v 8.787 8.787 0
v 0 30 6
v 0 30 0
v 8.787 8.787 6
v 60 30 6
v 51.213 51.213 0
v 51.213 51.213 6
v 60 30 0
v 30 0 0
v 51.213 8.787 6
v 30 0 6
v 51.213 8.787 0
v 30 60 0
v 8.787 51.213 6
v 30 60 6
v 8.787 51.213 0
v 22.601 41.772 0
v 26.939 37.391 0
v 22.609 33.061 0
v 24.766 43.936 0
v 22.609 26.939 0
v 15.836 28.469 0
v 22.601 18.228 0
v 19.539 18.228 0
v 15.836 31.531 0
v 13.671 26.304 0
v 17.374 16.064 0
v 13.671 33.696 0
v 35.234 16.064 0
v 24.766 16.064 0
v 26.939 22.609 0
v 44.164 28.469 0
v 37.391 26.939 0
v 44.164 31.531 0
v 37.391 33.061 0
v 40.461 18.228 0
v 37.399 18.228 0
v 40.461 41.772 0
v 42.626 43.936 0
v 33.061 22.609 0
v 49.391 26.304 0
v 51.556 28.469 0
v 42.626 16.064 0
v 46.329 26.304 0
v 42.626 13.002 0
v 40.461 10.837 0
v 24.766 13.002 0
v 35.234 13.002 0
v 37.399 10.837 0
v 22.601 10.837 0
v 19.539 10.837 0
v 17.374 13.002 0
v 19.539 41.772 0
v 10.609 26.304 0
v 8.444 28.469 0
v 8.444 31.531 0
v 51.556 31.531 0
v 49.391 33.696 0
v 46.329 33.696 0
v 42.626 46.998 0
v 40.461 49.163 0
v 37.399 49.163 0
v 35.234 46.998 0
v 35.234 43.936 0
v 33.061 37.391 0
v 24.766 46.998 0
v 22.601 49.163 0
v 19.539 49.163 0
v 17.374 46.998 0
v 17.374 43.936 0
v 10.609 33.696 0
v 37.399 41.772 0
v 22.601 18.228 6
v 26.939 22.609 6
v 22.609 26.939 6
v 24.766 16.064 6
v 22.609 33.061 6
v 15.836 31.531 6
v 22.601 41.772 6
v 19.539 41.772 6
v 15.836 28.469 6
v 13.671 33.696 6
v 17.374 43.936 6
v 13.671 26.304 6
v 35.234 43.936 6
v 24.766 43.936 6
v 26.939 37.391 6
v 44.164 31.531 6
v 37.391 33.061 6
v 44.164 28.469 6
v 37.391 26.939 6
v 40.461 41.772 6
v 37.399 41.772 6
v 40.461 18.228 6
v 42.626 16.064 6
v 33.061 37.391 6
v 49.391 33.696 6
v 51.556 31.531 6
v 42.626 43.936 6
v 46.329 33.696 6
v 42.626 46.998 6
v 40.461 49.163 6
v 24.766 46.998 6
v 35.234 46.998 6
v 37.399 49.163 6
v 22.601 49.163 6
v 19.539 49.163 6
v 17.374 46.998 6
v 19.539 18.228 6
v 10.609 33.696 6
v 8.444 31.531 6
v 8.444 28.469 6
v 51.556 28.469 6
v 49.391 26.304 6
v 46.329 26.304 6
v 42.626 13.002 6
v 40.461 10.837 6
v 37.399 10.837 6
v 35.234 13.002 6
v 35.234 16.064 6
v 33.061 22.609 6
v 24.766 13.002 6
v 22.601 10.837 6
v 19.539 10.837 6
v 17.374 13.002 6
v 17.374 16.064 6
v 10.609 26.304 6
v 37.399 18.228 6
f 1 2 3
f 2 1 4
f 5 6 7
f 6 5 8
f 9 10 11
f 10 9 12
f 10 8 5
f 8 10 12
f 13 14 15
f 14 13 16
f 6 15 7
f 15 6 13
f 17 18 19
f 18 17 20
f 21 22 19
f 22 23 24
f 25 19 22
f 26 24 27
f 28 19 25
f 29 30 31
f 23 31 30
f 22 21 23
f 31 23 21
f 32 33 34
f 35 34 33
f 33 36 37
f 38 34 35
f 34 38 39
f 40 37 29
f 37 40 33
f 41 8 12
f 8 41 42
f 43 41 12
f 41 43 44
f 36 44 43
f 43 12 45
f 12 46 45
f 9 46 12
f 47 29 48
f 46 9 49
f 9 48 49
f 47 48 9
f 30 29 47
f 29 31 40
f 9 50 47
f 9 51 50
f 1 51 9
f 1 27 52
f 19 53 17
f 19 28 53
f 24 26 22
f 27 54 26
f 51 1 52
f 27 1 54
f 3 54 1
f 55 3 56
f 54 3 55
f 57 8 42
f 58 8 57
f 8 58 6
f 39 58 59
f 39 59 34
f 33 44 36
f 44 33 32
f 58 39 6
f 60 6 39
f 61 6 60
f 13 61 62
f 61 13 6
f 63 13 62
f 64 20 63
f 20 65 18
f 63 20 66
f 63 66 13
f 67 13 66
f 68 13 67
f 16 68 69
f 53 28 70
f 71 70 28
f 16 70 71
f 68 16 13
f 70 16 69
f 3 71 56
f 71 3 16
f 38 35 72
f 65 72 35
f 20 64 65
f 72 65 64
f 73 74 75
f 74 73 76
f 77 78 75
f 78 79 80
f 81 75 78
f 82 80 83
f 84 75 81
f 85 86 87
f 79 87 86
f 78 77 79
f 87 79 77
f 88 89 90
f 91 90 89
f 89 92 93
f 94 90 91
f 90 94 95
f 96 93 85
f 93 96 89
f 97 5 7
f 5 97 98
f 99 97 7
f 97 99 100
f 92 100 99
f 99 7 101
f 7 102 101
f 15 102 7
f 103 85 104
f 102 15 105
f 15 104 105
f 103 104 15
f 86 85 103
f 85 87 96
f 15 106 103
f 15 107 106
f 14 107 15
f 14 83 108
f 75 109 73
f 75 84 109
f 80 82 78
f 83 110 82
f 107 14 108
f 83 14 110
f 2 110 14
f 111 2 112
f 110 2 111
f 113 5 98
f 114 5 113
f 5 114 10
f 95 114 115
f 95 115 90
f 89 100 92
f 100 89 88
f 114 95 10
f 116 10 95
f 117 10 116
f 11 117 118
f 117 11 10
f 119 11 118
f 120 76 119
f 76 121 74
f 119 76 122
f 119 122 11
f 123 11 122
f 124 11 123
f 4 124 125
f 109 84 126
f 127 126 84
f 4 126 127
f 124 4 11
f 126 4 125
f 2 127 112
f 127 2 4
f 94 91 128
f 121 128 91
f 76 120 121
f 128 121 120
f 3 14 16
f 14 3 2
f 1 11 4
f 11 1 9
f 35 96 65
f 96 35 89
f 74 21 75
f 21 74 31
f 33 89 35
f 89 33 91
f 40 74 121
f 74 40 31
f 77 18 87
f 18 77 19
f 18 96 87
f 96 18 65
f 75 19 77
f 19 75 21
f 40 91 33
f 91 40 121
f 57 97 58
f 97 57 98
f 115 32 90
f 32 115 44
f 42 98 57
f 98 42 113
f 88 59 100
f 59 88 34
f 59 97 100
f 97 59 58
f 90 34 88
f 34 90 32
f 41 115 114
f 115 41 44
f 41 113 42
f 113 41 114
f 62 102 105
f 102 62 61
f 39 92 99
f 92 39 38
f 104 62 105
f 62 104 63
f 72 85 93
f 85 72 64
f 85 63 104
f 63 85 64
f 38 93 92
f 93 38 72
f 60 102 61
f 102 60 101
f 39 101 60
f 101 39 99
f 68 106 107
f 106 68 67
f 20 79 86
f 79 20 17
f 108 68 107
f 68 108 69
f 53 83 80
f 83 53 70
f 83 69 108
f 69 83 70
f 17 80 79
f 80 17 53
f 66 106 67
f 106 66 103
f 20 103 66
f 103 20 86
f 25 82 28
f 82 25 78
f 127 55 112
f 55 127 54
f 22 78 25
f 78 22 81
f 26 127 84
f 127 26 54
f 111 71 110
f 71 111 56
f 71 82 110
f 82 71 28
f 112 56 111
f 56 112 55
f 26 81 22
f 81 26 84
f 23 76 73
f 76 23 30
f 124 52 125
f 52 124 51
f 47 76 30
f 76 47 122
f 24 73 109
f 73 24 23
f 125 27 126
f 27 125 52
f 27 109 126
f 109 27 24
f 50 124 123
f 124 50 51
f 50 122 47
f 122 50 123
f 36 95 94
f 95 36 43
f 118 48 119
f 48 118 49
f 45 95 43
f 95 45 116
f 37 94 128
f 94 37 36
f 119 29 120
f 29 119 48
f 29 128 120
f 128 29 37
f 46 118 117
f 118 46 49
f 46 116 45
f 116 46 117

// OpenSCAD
$fn = 32;

// ----------------------------------------------------------------------
// Polygon plate: 8-gon R30, 6 bolt windows
// ----------------------------------------------------------------------

// --- parameters (mm) ---
sides = 8;                // number of polygon sides
plate_r = 30;             // circumscribed radius of the polygon
bore_r = 8;               // centre bore radius
bolts = 6;                // number of bolt windows
ring_r = 17.86;           // bolt-circle radius
bolt_r = 4;               // bolt window radius
plate_t = 6;              // plate thickness, Z (extrusion height)

plate_d = 2 * plate_r;  // circumscribed diameter
bore_d = 2 * bore_r;  // centre bore diameter
bolt_d = 2 * bolt_r;  // bolt window diameter
ring_d = 2 * ring_r;  // bolt-circle diameter

profile = [[60, 30], [51.213, 51.213], [30, 60], [8.787, 51.213], [0, 30], [8.787, 8.787], [30, 0], [51.213, 8.787]];  // primary outline, 8 points, counter clockwise
void_1 = [[37.391, 33.061], [33.061, 37.391], [26.939, 37.391], [22.609, 33.061], [22.609, 26.939], [26.939, 22.609], [33.061, 22.609], [37.391, 26.939]];  // centre bore, 8 points
void_2 = [[51.556, 31.531], [49.391, 33.696], [46.329, 33.696], [44.164, 31.531], [44.164, 28.469], [46.329, 26.304], [49.391, 26.304], [51.556, 28.469]];  // bolt window 1, 8 points
void_3 = [[42.626, 46.998], [40.461, 49.163], [37.399, 49.163], [35.234, 46.998], [35.234, 43.936], [37.399, 41.772], [40.461, 41.772], [42.626, 43.936]];  // bolt window 2, 8 points
void_4 = [[24.766, 46.998], [22.601, 49.163], [19.539, 49.163], [17.374, 46.998], [17.374, 43.936], [19.539, 41.772], [22.601, 41.772], [24.766, 43.936]];  // bolt window 3, 8 points
void_5 = [[15.836, 31.531], [13.671, 33.696], [10.609, 33.696], [8.444, 31.531], [8.444, 28.469], [10.609, 26.304], [13.671, 26.304], [15.836, 28.469]];  // bolt window 4, 8 points
void_6 = [[24.766, 16.064], [22.601, 18.228], [19.539, 18.228], [17.374, 16.064], [17.374, 13.002], [19.539, 10.837], [22.601, 10.837], [24.766, 13.002]];  // bolt window 5, 8 points
void_7 = [[42.626, 16.064], [40.461, 18.228], [37.399, 18.228], [35.234, 16.064], [35.234, 13.002], [37.399, 10.837], [40.461, 10.837], [42.626, 13.002]];  // bolt window 6, 8 points

// --- the one profile operation ---
difference() {
  linear_extrude(height = plate_t) polygon(points = profile);
  translate([0, 0, -1])
    linear_extrude(height = plate_t + 2) polygon(points = void_1);
  translate([0, 0, -1])
    linear_extrude(height = plate_t + 2) polygon(points = void_2);
  translate([0, 0, -1])
    linear_extrude(height = plate_t + 2) polygon(points = void_3);
  translate([0, 0, -1])
    linear_extrude(height = plate_t + 2) polygon(points = void_4);
  translate([0, 0, -1])
    linear_extrude(height = plate_t + 2) polygon(points = void_5);
  translate([0, 0, -1])
    linear_extrude(height = plate_t + 2) polygon(points = void_6);
  translate([0, 0, -1])
    linear_extrude(height = plate_t + 2) polygon(points = void_7);
}
